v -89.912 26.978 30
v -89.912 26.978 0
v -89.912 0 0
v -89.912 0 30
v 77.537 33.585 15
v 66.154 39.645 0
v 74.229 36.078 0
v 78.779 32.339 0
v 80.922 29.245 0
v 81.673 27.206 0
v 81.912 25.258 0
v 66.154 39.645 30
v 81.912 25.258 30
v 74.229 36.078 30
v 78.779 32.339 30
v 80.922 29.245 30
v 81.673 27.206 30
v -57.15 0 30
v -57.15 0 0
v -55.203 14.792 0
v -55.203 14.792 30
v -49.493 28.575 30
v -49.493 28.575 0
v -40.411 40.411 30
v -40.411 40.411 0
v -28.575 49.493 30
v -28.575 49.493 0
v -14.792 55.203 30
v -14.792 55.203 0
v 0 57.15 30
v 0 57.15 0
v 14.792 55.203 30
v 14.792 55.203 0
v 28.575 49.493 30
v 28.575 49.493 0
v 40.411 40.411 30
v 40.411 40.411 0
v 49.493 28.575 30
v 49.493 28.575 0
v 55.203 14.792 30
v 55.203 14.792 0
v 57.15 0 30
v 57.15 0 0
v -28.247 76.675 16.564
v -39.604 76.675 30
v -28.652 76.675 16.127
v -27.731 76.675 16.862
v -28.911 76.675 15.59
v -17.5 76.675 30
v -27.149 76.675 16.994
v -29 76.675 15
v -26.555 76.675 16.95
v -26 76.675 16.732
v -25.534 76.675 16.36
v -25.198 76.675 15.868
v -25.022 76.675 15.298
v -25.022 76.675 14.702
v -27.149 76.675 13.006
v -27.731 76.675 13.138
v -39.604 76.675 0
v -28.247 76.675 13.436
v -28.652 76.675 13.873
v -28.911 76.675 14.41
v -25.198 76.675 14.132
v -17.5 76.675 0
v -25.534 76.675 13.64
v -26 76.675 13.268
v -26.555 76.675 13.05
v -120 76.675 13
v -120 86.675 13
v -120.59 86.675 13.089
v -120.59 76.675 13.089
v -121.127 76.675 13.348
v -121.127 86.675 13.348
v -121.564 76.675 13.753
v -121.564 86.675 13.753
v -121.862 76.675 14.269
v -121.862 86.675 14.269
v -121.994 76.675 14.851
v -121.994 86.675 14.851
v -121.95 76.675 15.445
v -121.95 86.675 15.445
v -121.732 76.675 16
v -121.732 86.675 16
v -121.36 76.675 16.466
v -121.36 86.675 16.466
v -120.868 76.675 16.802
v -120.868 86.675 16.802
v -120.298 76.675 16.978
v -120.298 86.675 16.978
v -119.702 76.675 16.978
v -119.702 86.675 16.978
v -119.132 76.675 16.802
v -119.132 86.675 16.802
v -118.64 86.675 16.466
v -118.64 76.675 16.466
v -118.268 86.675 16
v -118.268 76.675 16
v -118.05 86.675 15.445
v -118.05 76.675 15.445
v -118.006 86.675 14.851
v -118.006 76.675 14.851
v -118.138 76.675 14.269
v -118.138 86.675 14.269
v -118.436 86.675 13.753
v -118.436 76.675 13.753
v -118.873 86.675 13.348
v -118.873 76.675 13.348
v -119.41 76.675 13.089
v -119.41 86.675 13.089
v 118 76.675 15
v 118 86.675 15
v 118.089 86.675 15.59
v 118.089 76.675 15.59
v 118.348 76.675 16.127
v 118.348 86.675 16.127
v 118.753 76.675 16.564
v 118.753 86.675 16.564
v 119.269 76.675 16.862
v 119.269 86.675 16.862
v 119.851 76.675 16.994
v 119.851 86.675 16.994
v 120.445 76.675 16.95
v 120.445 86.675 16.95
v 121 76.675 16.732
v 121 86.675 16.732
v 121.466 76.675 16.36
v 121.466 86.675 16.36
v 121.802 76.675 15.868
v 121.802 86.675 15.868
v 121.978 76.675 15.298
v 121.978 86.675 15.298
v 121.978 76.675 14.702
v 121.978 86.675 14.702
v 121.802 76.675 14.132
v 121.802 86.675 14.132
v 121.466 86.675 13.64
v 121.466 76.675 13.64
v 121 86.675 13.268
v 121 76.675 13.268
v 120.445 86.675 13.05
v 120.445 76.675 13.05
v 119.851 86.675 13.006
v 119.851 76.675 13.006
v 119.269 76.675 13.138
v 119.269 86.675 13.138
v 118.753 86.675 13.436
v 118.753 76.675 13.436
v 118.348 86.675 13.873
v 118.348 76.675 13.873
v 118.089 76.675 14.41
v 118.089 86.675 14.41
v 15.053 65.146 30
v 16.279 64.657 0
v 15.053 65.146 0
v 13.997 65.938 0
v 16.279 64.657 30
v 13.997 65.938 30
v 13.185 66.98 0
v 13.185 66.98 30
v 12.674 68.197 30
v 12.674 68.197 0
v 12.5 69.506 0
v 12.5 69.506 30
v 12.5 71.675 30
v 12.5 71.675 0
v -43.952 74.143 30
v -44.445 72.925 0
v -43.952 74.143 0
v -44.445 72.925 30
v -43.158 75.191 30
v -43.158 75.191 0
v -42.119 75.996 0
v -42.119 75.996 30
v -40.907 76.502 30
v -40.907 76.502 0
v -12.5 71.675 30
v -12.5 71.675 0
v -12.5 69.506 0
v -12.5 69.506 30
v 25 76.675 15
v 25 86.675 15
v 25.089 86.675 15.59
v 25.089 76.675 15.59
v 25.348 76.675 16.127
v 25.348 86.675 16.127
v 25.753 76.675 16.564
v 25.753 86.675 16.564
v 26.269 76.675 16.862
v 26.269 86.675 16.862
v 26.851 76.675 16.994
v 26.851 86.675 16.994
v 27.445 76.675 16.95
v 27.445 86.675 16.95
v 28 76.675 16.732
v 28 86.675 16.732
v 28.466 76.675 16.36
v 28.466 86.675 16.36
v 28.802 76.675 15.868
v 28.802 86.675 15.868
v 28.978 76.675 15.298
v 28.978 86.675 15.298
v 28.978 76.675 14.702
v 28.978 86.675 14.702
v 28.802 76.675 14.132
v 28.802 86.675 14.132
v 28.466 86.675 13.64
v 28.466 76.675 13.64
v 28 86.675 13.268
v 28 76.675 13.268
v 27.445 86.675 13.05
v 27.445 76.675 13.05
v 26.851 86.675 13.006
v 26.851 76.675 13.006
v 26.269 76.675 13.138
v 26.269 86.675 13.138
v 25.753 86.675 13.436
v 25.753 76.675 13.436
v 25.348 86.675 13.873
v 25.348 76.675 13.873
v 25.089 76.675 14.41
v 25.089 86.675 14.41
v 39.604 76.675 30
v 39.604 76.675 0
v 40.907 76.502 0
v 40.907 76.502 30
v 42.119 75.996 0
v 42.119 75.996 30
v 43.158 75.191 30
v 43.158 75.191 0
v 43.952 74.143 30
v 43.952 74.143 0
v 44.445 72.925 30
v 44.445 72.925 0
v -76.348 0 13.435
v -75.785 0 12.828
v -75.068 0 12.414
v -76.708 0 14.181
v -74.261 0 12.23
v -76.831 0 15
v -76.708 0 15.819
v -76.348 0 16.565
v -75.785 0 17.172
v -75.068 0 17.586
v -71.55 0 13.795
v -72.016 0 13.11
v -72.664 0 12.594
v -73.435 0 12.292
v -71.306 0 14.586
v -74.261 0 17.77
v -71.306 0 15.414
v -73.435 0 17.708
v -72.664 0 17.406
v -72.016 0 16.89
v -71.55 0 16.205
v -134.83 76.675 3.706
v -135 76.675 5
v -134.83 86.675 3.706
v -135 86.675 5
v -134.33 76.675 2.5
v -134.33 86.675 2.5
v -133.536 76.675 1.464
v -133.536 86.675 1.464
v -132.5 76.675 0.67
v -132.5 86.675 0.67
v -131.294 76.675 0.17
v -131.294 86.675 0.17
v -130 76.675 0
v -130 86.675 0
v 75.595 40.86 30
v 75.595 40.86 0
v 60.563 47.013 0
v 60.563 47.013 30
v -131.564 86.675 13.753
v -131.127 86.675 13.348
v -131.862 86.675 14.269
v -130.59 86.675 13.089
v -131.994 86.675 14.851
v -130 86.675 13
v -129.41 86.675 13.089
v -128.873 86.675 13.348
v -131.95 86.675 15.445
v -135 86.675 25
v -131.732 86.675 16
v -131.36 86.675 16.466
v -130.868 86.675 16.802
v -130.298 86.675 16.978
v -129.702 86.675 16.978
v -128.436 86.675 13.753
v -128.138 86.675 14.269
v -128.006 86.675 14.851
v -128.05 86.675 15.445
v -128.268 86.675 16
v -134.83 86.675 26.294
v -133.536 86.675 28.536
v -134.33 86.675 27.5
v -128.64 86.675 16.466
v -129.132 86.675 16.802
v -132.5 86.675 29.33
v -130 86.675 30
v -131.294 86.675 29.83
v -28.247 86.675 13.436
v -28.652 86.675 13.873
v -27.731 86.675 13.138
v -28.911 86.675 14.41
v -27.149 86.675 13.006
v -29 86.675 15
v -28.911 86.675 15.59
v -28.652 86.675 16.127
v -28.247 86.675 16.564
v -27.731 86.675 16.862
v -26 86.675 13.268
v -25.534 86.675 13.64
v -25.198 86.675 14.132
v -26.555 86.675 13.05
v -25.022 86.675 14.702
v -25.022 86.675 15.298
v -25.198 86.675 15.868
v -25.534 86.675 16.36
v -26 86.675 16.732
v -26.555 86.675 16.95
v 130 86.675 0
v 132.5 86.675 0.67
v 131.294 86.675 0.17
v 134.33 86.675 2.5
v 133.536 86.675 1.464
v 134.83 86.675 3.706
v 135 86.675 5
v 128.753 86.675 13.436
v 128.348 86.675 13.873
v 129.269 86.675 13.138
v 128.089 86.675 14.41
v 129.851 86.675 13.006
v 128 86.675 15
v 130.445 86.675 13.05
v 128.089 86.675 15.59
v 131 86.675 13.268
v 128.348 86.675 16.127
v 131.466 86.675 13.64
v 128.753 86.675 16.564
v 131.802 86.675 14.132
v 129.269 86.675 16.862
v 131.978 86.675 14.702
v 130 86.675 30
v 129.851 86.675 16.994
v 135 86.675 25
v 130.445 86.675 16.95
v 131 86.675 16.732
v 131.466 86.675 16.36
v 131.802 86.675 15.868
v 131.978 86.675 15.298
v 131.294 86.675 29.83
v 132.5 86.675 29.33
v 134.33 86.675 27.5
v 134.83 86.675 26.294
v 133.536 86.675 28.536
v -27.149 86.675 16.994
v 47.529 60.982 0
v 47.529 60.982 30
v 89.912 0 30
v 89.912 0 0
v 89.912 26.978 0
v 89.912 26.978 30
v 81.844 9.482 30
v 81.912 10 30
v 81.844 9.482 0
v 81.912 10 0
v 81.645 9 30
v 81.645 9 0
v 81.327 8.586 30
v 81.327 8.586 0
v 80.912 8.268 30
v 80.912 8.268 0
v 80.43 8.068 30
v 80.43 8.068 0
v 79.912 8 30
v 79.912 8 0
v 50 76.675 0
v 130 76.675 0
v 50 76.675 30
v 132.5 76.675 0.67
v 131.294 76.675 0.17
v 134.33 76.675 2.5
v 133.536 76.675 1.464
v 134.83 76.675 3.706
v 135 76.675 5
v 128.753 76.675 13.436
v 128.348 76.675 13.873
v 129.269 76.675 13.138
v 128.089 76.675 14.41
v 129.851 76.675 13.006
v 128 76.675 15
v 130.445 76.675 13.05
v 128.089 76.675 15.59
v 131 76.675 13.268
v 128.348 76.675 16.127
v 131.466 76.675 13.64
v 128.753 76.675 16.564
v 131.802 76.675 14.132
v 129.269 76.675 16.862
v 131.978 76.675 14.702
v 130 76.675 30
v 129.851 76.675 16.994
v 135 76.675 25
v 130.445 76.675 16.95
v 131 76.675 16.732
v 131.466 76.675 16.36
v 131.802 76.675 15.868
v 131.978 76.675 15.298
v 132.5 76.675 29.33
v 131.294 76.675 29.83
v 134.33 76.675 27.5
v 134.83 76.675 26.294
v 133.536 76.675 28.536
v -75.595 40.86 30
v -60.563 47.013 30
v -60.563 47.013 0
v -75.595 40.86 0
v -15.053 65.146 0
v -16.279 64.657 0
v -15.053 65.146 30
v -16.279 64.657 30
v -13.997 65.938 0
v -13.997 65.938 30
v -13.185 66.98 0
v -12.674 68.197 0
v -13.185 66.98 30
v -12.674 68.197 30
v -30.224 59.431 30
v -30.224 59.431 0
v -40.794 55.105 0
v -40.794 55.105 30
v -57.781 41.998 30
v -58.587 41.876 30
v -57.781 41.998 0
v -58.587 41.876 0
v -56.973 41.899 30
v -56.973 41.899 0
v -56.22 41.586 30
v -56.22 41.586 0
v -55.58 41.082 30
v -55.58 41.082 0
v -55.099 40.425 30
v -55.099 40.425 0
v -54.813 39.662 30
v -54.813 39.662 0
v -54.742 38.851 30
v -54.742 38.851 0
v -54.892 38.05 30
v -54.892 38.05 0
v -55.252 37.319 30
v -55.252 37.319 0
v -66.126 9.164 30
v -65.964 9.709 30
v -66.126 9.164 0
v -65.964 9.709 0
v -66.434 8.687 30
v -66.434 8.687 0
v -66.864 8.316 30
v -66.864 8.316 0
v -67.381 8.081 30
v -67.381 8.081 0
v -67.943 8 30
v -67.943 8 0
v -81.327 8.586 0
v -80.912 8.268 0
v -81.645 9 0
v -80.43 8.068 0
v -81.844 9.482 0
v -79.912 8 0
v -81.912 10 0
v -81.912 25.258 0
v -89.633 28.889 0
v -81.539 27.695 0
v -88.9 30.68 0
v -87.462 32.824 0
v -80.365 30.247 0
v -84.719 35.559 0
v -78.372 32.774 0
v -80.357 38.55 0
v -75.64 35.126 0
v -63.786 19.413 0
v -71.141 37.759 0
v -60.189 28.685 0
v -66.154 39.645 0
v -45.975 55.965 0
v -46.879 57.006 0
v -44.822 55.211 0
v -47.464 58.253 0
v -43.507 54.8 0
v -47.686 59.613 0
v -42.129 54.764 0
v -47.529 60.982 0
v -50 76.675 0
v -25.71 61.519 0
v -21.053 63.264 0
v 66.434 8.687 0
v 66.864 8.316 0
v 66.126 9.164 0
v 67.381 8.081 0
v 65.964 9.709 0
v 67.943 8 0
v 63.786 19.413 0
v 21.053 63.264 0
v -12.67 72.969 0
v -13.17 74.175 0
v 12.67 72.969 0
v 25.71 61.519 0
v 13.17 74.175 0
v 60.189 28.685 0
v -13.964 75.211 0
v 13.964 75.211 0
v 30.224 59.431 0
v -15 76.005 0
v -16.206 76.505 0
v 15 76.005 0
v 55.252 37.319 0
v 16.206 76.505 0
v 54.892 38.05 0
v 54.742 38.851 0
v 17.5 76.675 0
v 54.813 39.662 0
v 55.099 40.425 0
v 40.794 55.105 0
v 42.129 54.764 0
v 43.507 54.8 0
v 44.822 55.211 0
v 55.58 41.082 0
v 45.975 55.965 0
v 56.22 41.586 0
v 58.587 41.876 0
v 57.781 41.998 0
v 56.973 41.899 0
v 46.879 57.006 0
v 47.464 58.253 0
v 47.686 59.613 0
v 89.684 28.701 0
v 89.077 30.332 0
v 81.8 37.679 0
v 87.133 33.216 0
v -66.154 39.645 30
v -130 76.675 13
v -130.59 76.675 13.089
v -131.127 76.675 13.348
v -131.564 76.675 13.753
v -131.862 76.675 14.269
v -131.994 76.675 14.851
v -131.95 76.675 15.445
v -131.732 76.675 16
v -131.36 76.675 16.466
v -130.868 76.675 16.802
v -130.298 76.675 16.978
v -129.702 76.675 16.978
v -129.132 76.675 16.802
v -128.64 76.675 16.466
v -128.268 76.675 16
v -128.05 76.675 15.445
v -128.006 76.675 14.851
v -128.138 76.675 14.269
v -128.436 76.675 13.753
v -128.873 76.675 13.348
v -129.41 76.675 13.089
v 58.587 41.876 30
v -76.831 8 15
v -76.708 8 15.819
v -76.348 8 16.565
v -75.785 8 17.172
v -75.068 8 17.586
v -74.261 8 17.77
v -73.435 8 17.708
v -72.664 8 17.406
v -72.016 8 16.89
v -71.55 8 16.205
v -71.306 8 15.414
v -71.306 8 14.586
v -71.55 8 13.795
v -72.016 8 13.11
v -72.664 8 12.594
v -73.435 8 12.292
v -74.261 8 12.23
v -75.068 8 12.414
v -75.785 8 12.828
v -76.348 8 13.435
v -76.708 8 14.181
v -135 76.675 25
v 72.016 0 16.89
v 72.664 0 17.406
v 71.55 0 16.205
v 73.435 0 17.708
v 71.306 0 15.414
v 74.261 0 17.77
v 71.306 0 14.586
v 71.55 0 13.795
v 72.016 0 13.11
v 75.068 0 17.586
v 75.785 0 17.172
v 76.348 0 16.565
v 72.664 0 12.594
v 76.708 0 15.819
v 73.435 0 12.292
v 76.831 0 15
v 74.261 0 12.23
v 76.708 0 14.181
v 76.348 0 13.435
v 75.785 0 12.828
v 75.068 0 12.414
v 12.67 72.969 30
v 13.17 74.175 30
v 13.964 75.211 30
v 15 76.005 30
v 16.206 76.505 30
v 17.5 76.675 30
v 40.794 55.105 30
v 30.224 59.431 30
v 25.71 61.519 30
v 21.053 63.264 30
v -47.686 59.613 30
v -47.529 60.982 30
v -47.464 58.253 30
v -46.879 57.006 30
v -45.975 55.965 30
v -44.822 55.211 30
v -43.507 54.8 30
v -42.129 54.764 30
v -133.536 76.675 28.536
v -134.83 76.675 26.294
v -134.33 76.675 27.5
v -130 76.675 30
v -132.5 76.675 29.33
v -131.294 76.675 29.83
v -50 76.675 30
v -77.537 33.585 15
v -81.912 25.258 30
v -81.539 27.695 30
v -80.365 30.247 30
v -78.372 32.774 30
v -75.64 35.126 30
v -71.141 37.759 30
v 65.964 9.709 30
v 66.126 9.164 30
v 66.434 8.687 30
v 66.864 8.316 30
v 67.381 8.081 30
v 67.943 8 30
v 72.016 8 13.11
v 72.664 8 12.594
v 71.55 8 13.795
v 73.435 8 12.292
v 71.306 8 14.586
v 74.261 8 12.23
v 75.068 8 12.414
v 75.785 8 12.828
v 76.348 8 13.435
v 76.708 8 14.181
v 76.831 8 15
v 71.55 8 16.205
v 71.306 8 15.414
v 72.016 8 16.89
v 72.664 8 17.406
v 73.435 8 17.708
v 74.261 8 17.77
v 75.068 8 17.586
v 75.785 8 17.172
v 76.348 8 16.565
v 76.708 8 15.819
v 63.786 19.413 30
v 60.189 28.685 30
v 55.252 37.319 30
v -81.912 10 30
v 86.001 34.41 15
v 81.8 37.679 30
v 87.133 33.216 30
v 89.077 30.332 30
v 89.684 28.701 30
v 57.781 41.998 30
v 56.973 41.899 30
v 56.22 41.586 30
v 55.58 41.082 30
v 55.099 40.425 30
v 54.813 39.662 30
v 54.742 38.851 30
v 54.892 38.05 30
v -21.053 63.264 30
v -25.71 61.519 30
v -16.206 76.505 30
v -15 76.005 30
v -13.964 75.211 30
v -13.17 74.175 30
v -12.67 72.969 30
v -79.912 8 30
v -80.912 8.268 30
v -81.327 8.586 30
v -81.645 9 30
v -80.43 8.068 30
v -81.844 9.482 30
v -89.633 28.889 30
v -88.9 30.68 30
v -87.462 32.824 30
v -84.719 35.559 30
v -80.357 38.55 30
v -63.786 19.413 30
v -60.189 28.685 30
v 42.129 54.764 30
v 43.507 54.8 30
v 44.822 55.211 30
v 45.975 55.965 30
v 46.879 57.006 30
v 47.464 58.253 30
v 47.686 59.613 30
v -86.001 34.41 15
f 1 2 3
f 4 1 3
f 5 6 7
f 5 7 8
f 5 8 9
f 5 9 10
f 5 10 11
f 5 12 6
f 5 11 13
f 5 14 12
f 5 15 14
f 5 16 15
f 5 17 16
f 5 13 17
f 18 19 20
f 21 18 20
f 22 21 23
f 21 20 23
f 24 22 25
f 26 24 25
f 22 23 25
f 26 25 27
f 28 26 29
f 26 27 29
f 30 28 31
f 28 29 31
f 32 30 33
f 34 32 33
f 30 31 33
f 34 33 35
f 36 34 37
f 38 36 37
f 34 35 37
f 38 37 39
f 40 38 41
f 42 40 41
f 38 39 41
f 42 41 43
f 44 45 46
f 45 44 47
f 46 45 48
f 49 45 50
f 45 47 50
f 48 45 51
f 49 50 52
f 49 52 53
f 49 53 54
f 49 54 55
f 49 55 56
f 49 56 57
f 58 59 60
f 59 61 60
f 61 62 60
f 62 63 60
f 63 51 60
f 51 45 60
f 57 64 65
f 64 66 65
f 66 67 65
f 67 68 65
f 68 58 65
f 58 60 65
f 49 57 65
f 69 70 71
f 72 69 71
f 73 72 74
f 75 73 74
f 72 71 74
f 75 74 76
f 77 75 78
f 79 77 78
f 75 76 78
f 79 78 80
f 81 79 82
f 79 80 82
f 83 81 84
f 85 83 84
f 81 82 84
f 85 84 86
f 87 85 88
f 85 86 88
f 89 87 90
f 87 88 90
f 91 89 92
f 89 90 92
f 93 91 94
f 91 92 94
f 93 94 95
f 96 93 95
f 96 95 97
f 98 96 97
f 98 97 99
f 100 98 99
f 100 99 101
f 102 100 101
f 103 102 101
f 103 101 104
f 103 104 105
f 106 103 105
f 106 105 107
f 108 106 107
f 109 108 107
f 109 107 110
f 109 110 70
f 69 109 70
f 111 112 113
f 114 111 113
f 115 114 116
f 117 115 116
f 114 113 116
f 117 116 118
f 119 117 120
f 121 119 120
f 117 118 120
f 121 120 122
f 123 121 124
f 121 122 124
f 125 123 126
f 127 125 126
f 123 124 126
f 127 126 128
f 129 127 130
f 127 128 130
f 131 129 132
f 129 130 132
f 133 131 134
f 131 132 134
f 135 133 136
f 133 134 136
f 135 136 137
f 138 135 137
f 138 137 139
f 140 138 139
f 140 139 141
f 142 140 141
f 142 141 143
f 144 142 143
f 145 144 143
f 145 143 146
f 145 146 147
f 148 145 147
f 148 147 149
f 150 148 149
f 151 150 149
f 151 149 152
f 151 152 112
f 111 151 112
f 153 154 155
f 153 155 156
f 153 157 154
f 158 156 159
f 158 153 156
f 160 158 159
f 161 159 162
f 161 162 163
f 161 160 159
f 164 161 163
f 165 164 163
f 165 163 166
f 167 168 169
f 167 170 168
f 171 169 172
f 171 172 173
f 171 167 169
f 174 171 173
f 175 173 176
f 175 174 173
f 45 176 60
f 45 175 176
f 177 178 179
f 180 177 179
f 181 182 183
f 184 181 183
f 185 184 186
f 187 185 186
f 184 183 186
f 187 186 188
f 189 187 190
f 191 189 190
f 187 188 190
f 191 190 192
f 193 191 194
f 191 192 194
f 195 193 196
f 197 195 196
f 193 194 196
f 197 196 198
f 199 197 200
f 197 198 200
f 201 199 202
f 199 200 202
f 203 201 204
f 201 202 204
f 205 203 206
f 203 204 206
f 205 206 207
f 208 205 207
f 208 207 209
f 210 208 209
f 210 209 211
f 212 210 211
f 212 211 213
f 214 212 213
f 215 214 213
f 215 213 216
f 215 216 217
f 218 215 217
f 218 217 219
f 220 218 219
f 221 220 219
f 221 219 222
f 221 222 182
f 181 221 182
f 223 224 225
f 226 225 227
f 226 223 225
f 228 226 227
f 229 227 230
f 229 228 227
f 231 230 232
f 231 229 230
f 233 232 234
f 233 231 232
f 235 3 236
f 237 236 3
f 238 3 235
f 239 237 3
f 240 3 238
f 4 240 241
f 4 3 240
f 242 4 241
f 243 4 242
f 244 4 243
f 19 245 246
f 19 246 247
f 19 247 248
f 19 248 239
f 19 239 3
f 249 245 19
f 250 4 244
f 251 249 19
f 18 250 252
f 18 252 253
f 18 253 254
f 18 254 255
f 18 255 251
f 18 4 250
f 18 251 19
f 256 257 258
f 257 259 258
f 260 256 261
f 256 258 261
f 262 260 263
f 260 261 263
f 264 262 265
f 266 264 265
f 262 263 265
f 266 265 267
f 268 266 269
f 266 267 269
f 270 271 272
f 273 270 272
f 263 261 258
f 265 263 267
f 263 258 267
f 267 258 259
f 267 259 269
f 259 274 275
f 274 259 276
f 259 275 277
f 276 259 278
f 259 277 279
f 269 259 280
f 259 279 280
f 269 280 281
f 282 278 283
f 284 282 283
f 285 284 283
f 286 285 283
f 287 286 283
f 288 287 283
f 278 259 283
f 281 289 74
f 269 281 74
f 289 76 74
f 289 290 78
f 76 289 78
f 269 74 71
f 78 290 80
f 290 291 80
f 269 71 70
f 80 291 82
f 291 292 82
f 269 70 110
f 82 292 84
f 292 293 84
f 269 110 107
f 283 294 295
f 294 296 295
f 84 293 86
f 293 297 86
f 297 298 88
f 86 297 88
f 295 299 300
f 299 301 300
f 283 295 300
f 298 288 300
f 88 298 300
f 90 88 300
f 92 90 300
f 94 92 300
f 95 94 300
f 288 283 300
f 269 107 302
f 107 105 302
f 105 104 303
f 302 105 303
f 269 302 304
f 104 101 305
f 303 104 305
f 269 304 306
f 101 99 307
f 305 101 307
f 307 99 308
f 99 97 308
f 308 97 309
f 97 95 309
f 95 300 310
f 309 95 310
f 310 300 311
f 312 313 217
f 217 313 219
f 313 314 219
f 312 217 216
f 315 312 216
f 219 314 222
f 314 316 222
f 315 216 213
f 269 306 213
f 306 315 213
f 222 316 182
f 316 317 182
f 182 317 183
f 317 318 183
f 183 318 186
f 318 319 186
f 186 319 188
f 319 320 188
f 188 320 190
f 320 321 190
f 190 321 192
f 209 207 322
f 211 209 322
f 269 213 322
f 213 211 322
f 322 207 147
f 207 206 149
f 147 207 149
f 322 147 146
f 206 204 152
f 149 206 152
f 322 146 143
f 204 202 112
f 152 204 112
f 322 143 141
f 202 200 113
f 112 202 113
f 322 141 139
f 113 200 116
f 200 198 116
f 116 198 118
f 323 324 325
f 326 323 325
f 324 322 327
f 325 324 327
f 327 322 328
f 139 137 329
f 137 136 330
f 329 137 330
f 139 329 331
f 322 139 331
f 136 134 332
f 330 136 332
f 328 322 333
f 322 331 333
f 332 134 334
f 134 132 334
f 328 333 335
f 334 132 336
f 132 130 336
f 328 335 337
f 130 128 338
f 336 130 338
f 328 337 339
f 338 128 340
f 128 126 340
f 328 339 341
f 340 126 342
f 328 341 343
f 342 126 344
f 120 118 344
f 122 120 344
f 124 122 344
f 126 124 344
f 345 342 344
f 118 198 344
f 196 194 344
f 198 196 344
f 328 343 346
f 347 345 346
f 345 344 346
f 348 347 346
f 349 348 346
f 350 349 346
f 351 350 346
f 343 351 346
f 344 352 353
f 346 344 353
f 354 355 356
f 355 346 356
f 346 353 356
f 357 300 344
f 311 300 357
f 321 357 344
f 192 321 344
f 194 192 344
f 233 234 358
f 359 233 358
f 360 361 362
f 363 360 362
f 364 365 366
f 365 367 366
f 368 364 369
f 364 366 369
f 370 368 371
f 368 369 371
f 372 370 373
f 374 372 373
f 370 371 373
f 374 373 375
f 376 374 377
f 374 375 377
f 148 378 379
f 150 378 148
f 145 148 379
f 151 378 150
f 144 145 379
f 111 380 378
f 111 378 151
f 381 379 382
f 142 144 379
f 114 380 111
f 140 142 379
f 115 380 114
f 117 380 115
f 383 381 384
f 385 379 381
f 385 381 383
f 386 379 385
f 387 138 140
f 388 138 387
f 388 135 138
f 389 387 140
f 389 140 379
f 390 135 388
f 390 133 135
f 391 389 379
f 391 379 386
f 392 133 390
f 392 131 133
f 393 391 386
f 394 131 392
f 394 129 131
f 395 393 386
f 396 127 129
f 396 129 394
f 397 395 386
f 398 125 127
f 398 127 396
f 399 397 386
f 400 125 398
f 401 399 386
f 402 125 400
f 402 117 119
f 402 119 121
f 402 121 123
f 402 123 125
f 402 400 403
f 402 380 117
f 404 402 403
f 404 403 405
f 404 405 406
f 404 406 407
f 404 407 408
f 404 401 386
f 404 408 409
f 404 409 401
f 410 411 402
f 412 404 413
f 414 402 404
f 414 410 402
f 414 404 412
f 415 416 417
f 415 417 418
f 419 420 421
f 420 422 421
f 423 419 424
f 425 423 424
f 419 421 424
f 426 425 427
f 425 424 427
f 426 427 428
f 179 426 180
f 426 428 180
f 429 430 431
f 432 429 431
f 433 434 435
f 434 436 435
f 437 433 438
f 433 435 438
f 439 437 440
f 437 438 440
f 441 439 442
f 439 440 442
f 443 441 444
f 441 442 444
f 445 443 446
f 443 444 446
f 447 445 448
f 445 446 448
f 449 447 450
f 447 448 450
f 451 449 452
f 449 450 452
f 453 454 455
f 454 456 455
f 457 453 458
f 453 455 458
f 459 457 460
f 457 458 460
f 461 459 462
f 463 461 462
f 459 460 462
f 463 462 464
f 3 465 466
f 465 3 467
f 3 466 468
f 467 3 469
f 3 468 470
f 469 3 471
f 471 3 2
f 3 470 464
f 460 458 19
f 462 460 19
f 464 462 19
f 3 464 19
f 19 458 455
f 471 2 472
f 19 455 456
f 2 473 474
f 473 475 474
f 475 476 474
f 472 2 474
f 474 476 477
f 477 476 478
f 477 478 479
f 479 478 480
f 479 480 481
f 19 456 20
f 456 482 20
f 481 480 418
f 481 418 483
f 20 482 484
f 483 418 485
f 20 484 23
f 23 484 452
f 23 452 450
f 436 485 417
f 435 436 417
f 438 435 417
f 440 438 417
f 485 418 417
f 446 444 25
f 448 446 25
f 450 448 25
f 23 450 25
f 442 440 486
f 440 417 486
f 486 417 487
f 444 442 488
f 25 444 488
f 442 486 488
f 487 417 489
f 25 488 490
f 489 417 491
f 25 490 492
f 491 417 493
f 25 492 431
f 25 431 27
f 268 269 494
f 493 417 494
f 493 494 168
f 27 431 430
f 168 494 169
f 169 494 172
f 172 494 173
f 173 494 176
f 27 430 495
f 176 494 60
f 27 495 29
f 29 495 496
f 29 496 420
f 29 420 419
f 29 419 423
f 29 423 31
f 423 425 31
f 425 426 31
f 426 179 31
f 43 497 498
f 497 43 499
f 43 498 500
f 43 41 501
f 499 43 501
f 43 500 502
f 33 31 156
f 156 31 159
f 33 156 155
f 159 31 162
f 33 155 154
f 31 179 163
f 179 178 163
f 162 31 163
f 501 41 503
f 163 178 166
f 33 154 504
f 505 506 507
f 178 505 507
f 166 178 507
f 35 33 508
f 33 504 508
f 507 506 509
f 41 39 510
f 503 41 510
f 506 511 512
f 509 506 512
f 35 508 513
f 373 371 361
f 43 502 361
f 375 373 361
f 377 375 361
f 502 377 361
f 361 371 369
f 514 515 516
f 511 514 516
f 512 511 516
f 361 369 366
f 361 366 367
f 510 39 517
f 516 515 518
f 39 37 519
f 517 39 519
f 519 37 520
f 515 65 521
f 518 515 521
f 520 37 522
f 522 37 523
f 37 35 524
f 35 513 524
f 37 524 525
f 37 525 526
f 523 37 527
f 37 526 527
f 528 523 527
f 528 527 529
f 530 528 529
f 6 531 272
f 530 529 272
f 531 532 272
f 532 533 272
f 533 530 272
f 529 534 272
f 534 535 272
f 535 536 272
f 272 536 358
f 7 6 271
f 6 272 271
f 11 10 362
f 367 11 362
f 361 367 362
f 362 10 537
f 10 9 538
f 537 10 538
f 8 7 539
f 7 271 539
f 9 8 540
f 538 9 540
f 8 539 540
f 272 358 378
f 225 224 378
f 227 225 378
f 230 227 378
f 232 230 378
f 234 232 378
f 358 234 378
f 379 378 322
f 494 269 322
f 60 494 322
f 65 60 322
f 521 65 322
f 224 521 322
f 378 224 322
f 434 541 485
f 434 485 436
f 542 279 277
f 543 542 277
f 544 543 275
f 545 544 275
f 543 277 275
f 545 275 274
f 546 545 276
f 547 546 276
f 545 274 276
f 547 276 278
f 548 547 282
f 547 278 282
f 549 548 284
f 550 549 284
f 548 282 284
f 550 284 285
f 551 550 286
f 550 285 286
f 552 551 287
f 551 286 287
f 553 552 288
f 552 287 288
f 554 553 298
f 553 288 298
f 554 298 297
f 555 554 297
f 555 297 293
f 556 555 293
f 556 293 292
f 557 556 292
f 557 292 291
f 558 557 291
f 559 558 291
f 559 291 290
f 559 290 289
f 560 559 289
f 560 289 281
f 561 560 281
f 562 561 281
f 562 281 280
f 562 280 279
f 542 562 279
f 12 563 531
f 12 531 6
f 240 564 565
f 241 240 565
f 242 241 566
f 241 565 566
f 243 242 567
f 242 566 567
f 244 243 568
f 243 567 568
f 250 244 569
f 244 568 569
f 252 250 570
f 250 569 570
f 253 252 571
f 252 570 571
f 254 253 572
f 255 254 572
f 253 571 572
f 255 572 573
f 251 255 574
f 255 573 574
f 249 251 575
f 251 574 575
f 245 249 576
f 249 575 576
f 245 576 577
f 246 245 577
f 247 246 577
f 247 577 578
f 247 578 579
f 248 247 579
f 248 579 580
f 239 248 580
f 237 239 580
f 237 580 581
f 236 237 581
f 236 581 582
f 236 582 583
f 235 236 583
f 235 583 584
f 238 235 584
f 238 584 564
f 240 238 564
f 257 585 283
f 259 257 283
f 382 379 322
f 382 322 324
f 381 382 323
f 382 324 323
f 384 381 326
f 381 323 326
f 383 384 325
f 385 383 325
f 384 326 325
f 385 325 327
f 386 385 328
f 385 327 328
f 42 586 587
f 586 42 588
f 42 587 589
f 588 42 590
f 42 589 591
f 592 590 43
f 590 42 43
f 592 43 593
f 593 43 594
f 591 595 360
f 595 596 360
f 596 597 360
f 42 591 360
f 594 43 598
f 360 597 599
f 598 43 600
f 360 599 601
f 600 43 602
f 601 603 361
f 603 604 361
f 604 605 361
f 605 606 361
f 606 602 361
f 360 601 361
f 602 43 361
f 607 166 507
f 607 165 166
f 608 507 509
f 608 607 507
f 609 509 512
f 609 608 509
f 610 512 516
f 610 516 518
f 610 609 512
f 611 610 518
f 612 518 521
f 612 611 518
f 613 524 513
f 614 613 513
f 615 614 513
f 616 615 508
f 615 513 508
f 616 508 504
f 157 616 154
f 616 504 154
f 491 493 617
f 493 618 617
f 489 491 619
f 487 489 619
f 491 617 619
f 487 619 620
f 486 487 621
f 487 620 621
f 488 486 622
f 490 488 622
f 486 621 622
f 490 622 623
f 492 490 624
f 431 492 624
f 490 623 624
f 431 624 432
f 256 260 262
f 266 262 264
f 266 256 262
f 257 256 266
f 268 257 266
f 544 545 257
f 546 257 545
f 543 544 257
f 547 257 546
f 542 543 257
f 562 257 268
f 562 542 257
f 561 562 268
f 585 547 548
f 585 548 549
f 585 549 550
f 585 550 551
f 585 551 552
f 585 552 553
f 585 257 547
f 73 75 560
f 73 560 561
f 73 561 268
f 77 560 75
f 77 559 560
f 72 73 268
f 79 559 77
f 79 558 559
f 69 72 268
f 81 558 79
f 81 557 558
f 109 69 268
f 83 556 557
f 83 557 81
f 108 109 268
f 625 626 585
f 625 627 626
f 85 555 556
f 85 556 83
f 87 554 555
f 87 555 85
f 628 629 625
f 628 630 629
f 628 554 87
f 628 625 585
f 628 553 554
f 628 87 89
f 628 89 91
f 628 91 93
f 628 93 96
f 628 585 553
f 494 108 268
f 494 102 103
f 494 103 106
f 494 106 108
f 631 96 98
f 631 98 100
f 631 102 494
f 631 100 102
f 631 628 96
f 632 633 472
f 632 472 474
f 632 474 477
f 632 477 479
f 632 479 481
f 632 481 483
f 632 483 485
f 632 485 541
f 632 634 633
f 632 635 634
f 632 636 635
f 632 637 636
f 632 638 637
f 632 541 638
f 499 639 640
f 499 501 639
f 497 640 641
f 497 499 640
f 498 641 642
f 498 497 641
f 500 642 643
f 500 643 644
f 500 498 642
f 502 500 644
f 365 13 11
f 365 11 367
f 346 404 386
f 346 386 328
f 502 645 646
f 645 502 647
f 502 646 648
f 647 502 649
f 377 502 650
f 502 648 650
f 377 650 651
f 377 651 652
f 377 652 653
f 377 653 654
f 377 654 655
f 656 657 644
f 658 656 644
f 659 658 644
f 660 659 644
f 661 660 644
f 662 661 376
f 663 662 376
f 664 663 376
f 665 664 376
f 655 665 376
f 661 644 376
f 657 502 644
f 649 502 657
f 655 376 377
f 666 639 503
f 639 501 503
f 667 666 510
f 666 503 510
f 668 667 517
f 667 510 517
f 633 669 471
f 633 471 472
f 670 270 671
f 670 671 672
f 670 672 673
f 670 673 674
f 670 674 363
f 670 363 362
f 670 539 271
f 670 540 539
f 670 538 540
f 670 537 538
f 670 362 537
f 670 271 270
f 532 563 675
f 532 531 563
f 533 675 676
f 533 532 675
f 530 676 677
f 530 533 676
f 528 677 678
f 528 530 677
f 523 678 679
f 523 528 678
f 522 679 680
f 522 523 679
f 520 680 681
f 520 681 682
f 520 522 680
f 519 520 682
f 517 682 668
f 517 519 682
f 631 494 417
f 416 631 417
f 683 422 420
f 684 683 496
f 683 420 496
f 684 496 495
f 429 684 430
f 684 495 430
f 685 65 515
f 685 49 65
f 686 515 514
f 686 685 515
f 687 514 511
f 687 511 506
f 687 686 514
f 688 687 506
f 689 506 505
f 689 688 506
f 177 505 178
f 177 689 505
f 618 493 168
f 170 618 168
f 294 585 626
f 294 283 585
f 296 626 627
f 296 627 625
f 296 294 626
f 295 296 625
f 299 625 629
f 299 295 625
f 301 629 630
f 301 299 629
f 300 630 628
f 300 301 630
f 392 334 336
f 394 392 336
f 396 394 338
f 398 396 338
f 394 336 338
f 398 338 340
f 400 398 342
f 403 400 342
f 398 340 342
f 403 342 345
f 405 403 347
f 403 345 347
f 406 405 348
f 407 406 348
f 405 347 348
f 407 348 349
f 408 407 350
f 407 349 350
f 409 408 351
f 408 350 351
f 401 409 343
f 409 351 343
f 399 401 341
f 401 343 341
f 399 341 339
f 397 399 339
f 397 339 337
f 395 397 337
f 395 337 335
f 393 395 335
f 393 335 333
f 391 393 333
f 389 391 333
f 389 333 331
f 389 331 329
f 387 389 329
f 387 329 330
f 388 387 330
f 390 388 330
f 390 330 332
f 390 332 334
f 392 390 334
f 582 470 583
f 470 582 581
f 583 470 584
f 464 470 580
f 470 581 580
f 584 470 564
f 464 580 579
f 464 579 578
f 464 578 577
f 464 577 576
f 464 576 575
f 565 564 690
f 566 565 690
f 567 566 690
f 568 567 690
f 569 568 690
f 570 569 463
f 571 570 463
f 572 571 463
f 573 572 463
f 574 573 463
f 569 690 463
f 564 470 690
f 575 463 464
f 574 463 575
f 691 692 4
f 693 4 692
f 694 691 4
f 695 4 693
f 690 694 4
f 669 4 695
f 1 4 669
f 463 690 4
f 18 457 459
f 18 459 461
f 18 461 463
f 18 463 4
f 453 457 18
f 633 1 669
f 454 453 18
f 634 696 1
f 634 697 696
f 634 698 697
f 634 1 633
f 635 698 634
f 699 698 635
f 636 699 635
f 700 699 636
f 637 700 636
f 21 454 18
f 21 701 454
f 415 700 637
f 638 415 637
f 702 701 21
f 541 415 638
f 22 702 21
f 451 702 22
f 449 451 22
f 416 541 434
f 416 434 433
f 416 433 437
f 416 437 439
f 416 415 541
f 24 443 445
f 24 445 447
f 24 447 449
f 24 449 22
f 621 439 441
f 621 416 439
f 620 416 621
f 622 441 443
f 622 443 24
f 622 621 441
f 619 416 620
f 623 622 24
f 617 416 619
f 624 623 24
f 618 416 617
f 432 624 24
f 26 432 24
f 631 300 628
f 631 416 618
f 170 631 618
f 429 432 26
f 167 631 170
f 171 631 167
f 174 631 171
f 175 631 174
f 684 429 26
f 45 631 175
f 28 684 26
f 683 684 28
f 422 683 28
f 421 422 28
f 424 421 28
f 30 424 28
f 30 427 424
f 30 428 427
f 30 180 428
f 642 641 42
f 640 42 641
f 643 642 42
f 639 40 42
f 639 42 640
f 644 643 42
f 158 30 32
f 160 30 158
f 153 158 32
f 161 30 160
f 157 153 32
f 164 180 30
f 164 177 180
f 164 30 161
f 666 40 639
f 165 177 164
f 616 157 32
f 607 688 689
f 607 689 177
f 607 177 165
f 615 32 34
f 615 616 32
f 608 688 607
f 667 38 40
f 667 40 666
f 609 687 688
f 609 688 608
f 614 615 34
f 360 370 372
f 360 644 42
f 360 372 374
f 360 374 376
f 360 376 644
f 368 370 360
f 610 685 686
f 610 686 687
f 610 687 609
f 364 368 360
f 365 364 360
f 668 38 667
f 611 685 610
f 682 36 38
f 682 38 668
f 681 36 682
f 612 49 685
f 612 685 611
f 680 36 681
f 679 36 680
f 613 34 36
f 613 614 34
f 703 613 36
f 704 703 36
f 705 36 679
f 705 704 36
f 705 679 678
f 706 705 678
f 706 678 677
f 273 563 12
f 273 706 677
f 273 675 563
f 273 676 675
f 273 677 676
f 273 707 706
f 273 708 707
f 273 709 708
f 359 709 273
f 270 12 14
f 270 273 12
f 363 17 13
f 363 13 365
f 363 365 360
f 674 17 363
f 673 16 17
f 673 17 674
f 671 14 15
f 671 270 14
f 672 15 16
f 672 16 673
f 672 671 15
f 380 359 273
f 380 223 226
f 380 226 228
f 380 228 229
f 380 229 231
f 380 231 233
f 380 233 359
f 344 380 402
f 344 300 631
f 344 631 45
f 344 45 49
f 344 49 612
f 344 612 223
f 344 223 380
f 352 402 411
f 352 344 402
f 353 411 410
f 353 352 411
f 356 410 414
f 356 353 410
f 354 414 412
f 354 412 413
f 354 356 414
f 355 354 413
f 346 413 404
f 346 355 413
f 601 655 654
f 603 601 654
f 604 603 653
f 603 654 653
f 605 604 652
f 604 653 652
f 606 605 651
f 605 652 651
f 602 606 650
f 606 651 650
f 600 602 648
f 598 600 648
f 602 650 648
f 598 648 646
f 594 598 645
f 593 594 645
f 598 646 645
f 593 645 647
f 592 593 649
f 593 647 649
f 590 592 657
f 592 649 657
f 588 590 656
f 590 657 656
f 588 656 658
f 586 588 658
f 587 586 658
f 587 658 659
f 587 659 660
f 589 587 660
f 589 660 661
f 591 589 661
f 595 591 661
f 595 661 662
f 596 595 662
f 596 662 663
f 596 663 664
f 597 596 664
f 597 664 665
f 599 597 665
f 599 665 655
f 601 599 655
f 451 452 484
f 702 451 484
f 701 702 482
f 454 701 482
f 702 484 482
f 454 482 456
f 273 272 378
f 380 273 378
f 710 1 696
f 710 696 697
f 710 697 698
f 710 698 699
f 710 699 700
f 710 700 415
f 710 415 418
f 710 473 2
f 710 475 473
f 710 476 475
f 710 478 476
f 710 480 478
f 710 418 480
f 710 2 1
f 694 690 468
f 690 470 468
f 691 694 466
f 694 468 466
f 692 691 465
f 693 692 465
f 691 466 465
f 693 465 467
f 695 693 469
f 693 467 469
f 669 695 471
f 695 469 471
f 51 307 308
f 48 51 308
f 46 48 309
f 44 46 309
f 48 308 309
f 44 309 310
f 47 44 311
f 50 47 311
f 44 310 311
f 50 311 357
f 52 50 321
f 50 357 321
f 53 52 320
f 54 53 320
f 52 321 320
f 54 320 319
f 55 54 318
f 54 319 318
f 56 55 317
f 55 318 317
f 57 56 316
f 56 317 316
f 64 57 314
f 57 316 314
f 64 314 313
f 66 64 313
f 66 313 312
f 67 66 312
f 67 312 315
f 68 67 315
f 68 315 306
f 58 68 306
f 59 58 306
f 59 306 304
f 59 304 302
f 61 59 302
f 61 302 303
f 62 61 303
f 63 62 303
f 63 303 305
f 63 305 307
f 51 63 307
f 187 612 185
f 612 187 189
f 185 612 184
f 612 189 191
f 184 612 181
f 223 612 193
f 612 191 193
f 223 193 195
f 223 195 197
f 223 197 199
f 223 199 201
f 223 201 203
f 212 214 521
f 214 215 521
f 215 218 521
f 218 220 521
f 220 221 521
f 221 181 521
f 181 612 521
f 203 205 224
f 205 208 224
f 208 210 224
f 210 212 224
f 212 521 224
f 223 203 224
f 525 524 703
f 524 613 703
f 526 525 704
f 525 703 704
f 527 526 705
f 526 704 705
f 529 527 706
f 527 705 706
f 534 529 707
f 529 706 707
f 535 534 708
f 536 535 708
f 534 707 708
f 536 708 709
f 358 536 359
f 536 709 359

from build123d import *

# Parameters (mm, degrees)
BOSS_EXTRUDE1_DEPTH = 30
SKETCH2_W           = 20
SKETCH2_H           = 8
BOSS_EXTRUDE2_DEPTH = 30
BOSS_EXTRUDE3_DEPTH = 30
SKETCH5_R           = 2.778125
CUT_EXTRUDE2_DEPTH  = 112.476514483
FILLET6_R           = 2
FILLET8_R           = 3
BOSS_EXTRUDE4_START = -30
SKETCH6_W           = 100
SKETCH6_H           = 10
BOSS_EXTRUDE4_DEPTH = 30
FILLET9_R           = 5
FILLET10_R          = 5
SKETCH7_W           = 270
SKETCH7_H           = 10
BOSS_EXTRUDE5_DEPTH = 30
SKETCH8_R           = 2
CUT_EXTRUDE3_DEPTH  = 30
FILLET11_R          = 5
SKETCH9_R           = 2
CUT_EXTRUDE4_DEPTH  = 13.175


with BuildPart() as part:
    # Sketch1 → Boss-Extrude1 (new body)
    with BuildSketch(Plane.XY):
        with BuildLine():
            ThreePointArc((66.675, 0), (0, 66.675), (-66.675, 0))
            Line((-66.675, 0), (-57.15, 0))
            ThreePointArc((-57.15, 0), (0, 57.15), (57.15, 0))
            Line((57.15, 0), (66.675, 0))
        make_face()
    extrude(amount=BOSS_EXTRUDE1_DEPTH)

    # Sketch2 → Boss-Extrude2 (add)
    with BuildSketch(Plane.XY.offset(30)):
        with Locations((-71.9125, 4)):
            Rectangle(SKETCH2_W, SKETCH2_H)
        with Locations((71.9125, 4)):
            Rectangle(SKETCH2_W, SKETCH2_H)
    extrude(amount=-BOSS_EXTRUDE2_DEPTH)

    # Sketch4 → Boss-Extrude3 (add)
    with BuildSketch(Plane.XY.offset(30)):
        Polygon((-89.9125, 0), (-81.9125, 0), (-81.9125, 35), (-40.473552557, 47.215668719), (-30.223695263, 59.431337438), (-89.9125, 35), align=None)
        Polygon((30.223695263, 59.431337438), (40.473552557, 47.215668719), (81.9125, 35), (81.9125, 0), (89.9125, 0), (89.9125, 35), align=None)
    extrude(amount=-BOSS_EXTRUDE3_DEPTH)

    # Sketch5 → Cut-Extrude2 (cut, through all)
    with BuildSketch(Plane(origin=(0, 8, 0), x_dir=(1, 0, 0), z_dir=(0, 1, 0))):
        with Locations(Location((-74.052910047, -15, 0), (0, 0, 180))):
            Circle(SKETCH5_R)
        with Locations((74.052910047, -15)):
            Circle(SKETCH5_R)
    extrude(amount=-CUT_EXTRUDE2_DEPTH, mode=Mode.SUBTRACT)

    # Fillet6
    fillet6_edges = [part.edges().sort_by_distance(p)[0] for p in [
        (-81.9125, 8, 15),
        (-66.193320093, 8, 15),
        (66.193320093, 8, 15),
        (81.9125, 8, 15),
    ]]
    fillet(fillet6_edges, radius=FILLET6_R)

    # Fillet7
    # a fillet whose section is not a circle: 20, 15 mm, written as the material it adds along each edge
    with BuildSketch(Plane(origin=(81.9125, 35, 30), x_dir=(-0.9591914836749359, 0.28275731227587253, 0), z_dir=(0, 0, -1))) as fillet7_piece_1:
        with BuildLine():
            Bezier((16.42908698, 0), (0, 0), (-2.754742693, -9.344853754), weights=[1, 0.800861197, 1])
            Line((-2.754742693, -9.344853754), (0, 0))
            Line((0, 0), (16.42908698, 0))
        make_face()
    extrude(amount=30)
    with BuildSketch(Plane(origin=(-81.9125, 35, 30), x_dir=(0, -1, 0), z_dir=(0, 0, -1))) as fillet7_piece_2:
        with BuildLine():
            Bezier((9.742427777, 0), (0, 0), (-4.645444478, -15.758640316), weights=[1, 0.800861197, 1])
            Line((-4.645444478, -15.758640316), (0, 0))
            Line((0, 0), (9.742427777, 0))
        make_face()
    extrude(amount=30)
    # a fillet whose section is not a circle: 20, 15 mm, written as the material it takes off along each edge
    with BuildSketch(Plane(origin=(89.9125, 35, 68.677099201), x_dir=(0, -1, 0), z_dir=(0, 0, -1))) as fillet7_2_piece_1:
        with BuildLine():
            Bezier((8.021650729, 0), (0, 0), (-5.860478322, 14.317879531), weights=[1, 0.830303568, 1])
            Line((-5.860478322, 14.317879531), (0, 0))
            Line((0, 0), (8.021650729, 0))
        make_face()
    extrude(amount=107.354198402, mode=Mode.SUBTRACT)
    with BuildSketch(Plane(origin=(-89.9125, 35, 68.677099201), x_dir=(0.9254752700268907, 0.37880803128847984, 0), z_dir=(0, 0, -1))) as fillet7_2_piece_2:
        with BuildLine():
            Bezier((15.47083968, 0), (0, 0), (-3.03866572, 7.423839374), weights=[1, 0.830303568, 1])
            Line((-3.03866572, 7.423839374), (0, 0))
            Line((0, 0), (15.47083968, 0))
        make_face()
    extrude(amount=107.354198402, mode=Mode.SUBTRACT)

    # Fillet8
    fillet8_edges = [part.edges().sort_by_distance(p)[0] for p in [
        (-49.639626869, 44.513627906, 15),
        (49.639626869, 44.513627906, 15),
    ]]
    fillet(fillet8_edges, radius=FILLET8_R)

    # Sketch6 → Boss-Extrude4 (add)
    with BuildSketch(Plane.XY.offset(30).offset(BOSS_EXTRUDE4_START)):
        with Locations((0, 81.675)):
            Rectangle(SKETCH6_W, SKETCH6_H)
        Polygon((-43.476507509, 76.675), (-50, 76.675), (-60.5630878, 47.013063358), (-50.022382459, 51.327499376), align=None)
        with BuildLine():
            Line((12.5, 76.675), (-12.5, 76.675))
            Line((-12.5, 76.675), (-12.5, 65.492790634))
            ThreePointArc((-12.5, 65.492790634), (0, 66.675), (12.5, 65.492790634))
            Line((12.5, 65.492790634), (12.5, 76.675))
        make_face()
        Polygon((60.5630878, 47.013063358), (50, 76.675), (43.476507509, 76.675), (50.022382459, 51.327499376), align=None)
    extrude(amount=BOSS_EXTRUDE4_DEPTH)

    # Fillet9
    fillet9_edges = [part.edges().sort_by_distance(p)[0] for p in [
        (43.476507509, 76.675, 15),
        (12.5, 76.675, 15),
        (12.5, 65.492790634, 15),
        (-12.5, 65.492790634, 15),
        (-12.5, 76.675, 15),
        (-43.476507509, 76.675, 15),
    ]]
    fillet(fillet9_edges, radius=FILLET9_R)

    # Fillet10
    fillet10_edges = [part.edges().sort_by_distance(p)[0] for p in [
        (-50.022382459, 51.327499376, 15),
        (50.022382459, 51.327499376, 15),
    ]]
    fillet(fillet10_edges, radius=FILLET10_R)

    # Sketch7 → Boss-Extrude5 (add)
    with BuildSketch(Plane.XY.offset(30)):
        with Locations((0, 81.675)):
            Rectangle(SKETCH7_W, SKETCH7_H)
    extrude(amount=-BOSS_EXTRUDE5_DEPTH)

    # Sketch8 → Cut-Extrude3 (cut)
    with BuildSketch(Plane(origin=(0, 86.675, 0), x_dir=(1, 0, 0), z_dir=(0, 1, 0))):
        with Locations(Location((130, -15, 0), (0, 0, 180))):
            Circle(SKETCH8_R)
        with Locations(Location((120, -15, 0), (0, 0, 180))):
            Circle(SKETCH8_R)
        with Locations(Location((-120, -15, 0), (0, 0, 90))):
            Circle(SKETCH8_R)
        with Locations(Location((-130, -15, 0), (0, 0, 90))):
            Circle(SKETCH8_R)
    extrude(amount=-CUT_EXTRUDE3_DEPTH, mode=Mode.SUBTRACT)

    # Fillet11
    fillet11_edges = [part.edges().sort_by_distance(p)[0] for p in [
        (135, 81.675, 30),
        (-135, 81.675, 0),
        (135, 81.675, 0),
        (-135, 81.675, 30),
    ]]
    fillet(fillet11_edges, radius=FILLET11_R)

    # Sketch9 → Cut-Extrude4 (cut)
    with BuildSketch(Plane(origin=(0, 86.675, 0), x_dir=(1, 0, 0), z_dir=(0, 1, 0))):
        with Locations(Location((27, -15, 0), (0, 0, 180))):
            Circle(SKETCH9_R)
        with Locations(Location((-27, -15, 0), (0, 0, 180))):
            Circle(SKETCH9_R)
    extrude(amount=-CUT_EXTRUDE4_DEPTH, mode=Mode.SUBTRACT)


solid = part.part
